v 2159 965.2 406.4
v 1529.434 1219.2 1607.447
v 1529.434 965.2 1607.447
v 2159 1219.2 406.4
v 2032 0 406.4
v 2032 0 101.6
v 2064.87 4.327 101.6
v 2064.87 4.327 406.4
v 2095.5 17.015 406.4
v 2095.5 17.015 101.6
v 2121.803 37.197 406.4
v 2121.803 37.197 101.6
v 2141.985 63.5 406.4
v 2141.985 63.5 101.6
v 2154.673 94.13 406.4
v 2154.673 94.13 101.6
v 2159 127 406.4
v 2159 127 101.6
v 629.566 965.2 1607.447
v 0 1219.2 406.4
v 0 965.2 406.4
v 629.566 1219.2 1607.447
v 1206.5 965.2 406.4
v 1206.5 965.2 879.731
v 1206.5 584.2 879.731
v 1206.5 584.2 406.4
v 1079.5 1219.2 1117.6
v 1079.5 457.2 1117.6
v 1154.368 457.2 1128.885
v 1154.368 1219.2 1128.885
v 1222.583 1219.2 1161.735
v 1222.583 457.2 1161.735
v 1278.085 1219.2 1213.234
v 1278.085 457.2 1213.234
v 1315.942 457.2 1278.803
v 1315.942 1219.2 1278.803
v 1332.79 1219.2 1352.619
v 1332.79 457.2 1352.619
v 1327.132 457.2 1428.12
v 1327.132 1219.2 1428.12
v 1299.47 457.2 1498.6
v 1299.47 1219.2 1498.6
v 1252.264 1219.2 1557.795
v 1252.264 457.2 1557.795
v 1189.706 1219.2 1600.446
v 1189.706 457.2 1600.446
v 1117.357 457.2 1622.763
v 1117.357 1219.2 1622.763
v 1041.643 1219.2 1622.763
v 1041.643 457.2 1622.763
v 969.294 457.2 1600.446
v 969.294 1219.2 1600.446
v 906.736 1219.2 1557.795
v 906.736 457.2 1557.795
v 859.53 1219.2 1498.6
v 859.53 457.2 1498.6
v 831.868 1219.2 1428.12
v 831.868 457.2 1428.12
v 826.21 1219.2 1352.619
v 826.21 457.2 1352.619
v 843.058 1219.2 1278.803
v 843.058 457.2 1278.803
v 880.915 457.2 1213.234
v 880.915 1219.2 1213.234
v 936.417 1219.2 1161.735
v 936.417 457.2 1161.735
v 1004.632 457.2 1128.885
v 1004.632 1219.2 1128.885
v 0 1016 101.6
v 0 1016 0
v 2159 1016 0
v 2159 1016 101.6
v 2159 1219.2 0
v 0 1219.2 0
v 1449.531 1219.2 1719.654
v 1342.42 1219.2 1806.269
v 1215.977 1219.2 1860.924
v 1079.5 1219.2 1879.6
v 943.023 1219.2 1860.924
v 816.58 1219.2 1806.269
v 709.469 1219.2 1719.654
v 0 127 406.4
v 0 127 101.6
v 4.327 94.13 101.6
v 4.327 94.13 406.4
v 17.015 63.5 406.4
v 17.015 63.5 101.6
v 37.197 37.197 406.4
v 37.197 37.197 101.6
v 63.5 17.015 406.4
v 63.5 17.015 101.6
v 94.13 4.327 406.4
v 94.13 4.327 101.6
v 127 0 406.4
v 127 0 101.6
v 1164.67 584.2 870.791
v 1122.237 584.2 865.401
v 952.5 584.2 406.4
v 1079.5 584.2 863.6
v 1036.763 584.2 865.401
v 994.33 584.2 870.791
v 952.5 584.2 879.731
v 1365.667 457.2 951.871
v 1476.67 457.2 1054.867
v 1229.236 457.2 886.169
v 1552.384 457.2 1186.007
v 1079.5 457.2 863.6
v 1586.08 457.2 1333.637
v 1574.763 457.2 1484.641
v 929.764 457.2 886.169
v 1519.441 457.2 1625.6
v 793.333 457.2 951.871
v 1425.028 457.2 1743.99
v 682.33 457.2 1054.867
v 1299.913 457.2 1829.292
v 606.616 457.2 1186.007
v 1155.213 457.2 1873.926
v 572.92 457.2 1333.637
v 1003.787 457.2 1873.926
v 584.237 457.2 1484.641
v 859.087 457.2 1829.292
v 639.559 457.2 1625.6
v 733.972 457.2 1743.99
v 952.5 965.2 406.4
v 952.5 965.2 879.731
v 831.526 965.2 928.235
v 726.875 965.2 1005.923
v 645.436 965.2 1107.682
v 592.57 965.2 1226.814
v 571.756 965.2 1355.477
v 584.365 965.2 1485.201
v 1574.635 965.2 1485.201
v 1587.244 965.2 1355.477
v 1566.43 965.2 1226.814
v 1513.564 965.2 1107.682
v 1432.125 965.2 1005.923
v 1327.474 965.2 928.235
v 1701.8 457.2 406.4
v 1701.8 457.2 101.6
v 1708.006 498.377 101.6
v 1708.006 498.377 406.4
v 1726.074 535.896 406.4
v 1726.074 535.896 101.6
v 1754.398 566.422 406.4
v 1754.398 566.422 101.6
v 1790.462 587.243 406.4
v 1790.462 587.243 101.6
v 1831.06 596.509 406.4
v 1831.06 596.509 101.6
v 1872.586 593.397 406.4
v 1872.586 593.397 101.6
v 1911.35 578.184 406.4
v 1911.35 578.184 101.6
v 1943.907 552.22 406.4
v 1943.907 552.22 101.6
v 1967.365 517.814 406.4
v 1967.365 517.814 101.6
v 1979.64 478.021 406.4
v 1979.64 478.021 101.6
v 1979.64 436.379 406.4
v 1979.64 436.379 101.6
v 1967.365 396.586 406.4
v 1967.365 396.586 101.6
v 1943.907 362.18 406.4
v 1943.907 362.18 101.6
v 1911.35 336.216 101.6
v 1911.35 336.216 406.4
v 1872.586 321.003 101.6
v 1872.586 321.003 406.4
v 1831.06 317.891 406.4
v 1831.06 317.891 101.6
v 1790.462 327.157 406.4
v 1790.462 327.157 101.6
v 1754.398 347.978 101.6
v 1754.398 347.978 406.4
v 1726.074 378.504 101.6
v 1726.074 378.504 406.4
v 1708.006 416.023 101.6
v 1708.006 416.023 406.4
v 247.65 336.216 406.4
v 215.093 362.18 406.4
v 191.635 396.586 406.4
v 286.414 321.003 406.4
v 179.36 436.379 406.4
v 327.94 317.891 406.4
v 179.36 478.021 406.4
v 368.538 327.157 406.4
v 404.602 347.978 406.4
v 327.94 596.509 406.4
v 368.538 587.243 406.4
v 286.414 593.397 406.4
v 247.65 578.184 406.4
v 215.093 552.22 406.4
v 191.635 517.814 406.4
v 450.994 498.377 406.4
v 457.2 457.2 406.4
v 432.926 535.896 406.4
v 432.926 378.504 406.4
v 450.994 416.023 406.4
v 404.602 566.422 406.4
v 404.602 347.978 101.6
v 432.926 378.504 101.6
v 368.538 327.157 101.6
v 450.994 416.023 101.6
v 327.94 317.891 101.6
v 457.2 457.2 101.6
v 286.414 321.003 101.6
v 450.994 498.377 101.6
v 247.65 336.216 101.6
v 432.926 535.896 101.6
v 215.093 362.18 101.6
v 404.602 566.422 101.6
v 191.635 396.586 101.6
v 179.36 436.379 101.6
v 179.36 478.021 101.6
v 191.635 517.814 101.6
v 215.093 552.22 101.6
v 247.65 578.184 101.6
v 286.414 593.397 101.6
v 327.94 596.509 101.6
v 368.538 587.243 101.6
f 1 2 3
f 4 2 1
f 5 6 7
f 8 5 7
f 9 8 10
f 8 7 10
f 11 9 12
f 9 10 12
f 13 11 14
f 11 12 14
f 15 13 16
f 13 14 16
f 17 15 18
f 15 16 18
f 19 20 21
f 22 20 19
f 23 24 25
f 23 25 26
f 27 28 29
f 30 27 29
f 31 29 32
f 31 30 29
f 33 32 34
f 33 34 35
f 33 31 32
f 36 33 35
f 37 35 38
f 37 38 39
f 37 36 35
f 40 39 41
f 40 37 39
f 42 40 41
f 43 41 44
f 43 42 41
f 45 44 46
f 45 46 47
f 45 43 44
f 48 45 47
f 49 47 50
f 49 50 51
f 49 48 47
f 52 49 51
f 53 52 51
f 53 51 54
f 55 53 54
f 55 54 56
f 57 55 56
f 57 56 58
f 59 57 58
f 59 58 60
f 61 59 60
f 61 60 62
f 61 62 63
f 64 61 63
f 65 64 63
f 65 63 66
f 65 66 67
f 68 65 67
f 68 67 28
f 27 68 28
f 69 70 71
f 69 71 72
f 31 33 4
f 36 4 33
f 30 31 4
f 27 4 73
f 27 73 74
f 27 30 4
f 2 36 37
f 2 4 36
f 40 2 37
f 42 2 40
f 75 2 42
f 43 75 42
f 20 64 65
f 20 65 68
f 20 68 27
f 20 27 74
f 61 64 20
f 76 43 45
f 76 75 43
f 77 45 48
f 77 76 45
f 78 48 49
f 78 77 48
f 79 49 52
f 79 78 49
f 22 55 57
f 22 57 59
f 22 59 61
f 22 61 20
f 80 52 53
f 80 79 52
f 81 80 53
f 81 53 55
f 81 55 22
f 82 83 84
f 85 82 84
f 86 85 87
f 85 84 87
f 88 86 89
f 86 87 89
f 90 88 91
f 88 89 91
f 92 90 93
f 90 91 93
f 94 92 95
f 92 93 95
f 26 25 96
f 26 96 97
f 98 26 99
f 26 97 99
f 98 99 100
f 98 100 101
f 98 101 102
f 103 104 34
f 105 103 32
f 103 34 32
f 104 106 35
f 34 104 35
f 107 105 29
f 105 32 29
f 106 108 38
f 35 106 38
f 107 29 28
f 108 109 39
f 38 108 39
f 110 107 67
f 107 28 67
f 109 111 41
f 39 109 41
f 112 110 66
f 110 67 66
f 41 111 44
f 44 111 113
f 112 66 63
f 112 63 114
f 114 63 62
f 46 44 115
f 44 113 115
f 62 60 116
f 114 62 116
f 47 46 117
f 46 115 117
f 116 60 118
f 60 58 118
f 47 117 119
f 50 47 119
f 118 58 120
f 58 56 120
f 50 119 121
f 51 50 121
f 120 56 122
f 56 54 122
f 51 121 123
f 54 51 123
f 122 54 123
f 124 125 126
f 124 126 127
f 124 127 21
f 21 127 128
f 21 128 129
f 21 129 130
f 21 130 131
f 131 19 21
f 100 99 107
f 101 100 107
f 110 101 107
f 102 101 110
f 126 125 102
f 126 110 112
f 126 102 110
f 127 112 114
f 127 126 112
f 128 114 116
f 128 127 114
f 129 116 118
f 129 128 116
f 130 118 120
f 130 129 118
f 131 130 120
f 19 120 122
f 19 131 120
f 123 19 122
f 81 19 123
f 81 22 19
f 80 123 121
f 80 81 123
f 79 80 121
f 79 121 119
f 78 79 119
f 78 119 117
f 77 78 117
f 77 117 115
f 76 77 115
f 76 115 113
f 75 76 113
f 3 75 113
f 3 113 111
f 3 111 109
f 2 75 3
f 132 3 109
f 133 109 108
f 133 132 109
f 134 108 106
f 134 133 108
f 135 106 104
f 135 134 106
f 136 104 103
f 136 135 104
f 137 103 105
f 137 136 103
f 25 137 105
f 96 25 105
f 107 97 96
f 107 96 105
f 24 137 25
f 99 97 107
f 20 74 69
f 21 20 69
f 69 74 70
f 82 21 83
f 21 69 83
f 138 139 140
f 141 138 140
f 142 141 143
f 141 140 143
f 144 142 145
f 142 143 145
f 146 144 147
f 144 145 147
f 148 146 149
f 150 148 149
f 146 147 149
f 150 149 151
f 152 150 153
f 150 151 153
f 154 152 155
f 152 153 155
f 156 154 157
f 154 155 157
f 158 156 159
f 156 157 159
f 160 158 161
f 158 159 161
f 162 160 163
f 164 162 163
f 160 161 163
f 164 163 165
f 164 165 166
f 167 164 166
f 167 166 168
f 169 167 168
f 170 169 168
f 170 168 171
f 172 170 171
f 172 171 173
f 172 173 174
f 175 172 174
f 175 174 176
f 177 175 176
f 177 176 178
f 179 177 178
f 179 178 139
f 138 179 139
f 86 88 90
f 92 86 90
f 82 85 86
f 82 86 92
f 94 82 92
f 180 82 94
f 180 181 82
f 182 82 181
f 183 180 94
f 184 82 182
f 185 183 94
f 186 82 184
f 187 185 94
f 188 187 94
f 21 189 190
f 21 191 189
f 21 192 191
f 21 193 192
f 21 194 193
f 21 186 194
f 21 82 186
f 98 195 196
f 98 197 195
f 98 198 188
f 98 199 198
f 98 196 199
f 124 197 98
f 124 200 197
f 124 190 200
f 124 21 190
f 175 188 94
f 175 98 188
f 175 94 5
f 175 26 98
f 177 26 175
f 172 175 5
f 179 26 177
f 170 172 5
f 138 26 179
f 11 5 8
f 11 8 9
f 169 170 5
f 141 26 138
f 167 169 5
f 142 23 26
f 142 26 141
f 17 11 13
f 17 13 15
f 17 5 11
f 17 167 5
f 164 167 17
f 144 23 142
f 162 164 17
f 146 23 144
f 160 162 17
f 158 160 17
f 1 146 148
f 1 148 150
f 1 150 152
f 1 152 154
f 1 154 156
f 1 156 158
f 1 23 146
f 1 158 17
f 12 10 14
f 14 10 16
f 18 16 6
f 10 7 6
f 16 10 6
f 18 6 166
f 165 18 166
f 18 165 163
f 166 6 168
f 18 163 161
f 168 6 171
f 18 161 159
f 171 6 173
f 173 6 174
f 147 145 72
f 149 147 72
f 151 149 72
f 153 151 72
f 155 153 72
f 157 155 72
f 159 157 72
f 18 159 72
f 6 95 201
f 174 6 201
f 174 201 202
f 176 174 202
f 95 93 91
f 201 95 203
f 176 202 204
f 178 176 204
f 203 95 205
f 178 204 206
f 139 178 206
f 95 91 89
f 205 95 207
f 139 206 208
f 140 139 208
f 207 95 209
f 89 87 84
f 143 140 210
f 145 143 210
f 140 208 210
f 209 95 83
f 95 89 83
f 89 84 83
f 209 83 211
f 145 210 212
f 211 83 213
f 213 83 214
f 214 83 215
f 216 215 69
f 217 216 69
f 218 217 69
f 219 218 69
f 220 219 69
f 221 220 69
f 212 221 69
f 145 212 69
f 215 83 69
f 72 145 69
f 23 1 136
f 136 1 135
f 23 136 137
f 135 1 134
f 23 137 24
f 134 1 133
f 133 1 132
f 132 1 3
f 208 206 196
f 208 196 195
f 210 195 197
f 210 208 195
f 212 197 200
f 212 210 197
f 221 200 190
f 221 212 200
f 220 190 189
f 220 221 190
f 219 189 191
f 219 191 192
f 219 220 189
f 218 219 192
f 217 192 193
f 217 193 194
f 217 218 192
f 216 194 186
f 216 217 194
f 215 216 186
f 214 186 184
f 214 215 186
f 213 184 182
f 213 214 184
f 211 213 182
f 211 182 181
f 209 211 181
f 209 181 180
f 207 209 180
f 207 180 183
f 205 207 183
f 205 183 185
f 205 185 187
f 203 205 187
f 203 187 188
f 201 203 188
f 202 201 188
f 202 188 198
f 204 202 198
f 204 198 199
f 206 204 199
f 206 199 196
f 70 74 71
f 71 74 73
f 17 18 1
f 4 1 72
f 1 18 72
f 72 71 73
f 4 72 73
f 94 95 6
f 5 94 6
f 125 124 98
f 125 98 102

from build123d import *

# Parameters (mm, degrees)
F0_R     = 139.7
F1_DEPTH = 406.4
F2_W     = 889
F2_H     = 101.6
F2_W_2   = 127
F3_DEPTH = 2159.001
F5_DEPTH = 254
F6_DEPTH = 635
F7_DEPTH = 762


with BuildPart() as f1:
    # F0 (on Top) → F1 (new body)
    with BuildSketch(Plane.XY):
        with BuildLine():
            ThreePointArc((0, 127), (37.1974387893, 37.1974387893), (127, 0))
            Line((127, 0), (1079.5, 0))
            Line((1079.5, 0), (2032, 0))
            ThreePointArc((2032, 0), (2121.8025612107, 37.1974387893), (2159, 127))
            Line((2159, 127), (2159, 1219.2))
            Line((2159, 1219.2), (0, 1219.2))
            Line((0, 1219.2), (0, 127))
        make_face()
        with Locations((317.5, 457.2)):
            Circle(F0_R, mode=Mode.SUBTRACT)
        with BuildLine():
            ThreePointArc((1981.2, 457.2), (1841.5, 317.5), (1701.8, 457.2))
            ThreePointArc((1701.8, 457.2), (1841.5, 596.9), (1981.2, 457.2))
        make_face(mode=Mode.SUBTRACT)
    extrude(amount=F1_DEPTH)

    # F2 (on face) → F3 (cut, through all)
    with BuildSketch(Plane(origin=(0, 0, 0), x_dir=(0, -1, 0), z_dir=(-1, 0, 0))):
        with Locations((-571.5, 50.8)):
            Rectangle(F2_W, F2_H)
        with Locations((-63.5, 50.8)):
            Rectangle(F2_W_2, F2_H)
    extrude(amount=-F3_DEPTH, mode=Mode.SUBTRACT)

    # F4 (on face) → F5 (join)
    with BuildSketch(Plane(origin=(0, 1219.2, 0), x_dir=(-1, 0, 0), z_dir=(0, 1, 0))):
        with BuildLine():
            Line((-952.5, 879.7311150317), (-952.5, 406.4))
            Line((-952.5, 406.4), (0, 406.4))
            Line((0, 406.4), (-629.566366733, 1607.4468266802))
            ThreePointArc((-629.566366733, 1607.4468266802), (-586.2301520974, 1493.0448728855), (-571.5, 1371.6))
            ThreePointArc((-571.5, 1371.6), (-677.8907371586, 1060.5148026665), (-952.5, 879.7311150317))
        make_face()
        with BuildLine():
            Line((-2159, 406.4), (-1206.5, 406.4))
            Line((-1206.5, 406.4), (-1206.5, 879.7311150317))
            ThreePointArc((-1206.5, 879.7311150317), (-1543.8335477259, 1165.5457439016), (-1529.433633267, 1607.4468266802))
            Line((-1529.433633267, 1607.4468266802), (-2159, 406.4))
        make_face()
        with BuildLine():
            Line((-1206.5, 965.2), (-1079.5, 965.2))
            Line((-1079.5, 965.2), (-952.5, 965.2))
            Line((-952.5, 965.2), (-952.5, 879.7311150317))
            ThreePointArc((-952.5, 879.7311150317), (-677.8907371586, 1060.5148026665), (-571.5, 1371.6))
            ThreePointArc((-571.5, 1371.6), (-586.2301520974, 1493.0448728855), (-629.566366733, 1607.4468266802))
            ThreePointArc((-629.566366733, 1607.4468266802), (-1079.5, 1879.6), (-1529.433633267, 1607.4468266802))
            ThreePointArc((-1529.433633267, 1607.4468266802), (-1543.8335477259, 1165.5457439016), (-1206.5, 879.7311150317))
            Line((-1206.5, 879.7311150317), (-1206.5, 965.2))
        make_face()
        with BuildLine():
            ThreePointArc((-825.5, 1371.6), (-899.8948775786, 1191.9948775786), (-1079.5, 1117.6))
            ThreePointArc((-1079.5, 1117.6), (-1259.1051224214, 1551.2051224214), (-825.5, 1371.6))
        make_face(mode=Mode.SUBTRACT)
        with BuildLine():
            Line((-1079.5, 863.6), (-1079.5, 406.4))
            Line((-1079.5, 406.4), (-952.5, 406.4))
            Line((-952.5, 406.4), (-952.5, 879.7311150317))
            ThreePointArc((-952.5, 879.7311150317), (-1015.4898194188, 867.6489142963), (-1079.5, 863.6))
        make_face()
        with BuildLine():
            Line((-1079.5, 965.2), (-1079.5, 863.6))
            ThreePointArc((-1079.5, 863.6), (-1015.4898194188, 867.6489142963), (-952.5, 879.7311150317))
            Line((-952.5, 879.7311150317), (-952.5, 965.2))
            Line((-952.5, 965.2), (-1079.5, 965.2))
        make_face()
        with BuildLine():
            ThreePointArc((-1206.5, 879.7311150317), (-1143.5101805812, 867.6489142963), (-1079.5, 863.6))
            Line((-1079.5, 863.6), (-1079.5, 965.2))
            Line((-1079.5, 965.2), (-1206.5, 965.2))
            Line((-1206.5, 965.2), (-1206.5, 879.7311150317))
        make_face()
        with BuildLine():
            Line((-1206.5, 406.4), (-1079.5, 406.4))
            Line((-1079.5, 406.4), (-1079.5, 863.6))
            ThreePointArc((-1079.5, 863.6), (-1143.5101805812, 867.6489142963), (-1206.5, 879.7311150317))
            Line((-1206.5, 879.7311150317), (-1206.5, 406.4))
        make_face()
    extrude(amount=-F5_DEPTH)

    # F4 (on face) → F6 (join)
    with BuildSketch(Plane(origin=(0, 1219.2, 0), x_dir=(-1, 0, 0), z_dir=(0, 1, 0))):
        with BuildLine():
            Line((-1206.5, 406.4), (-1079.5, 406.4))
            Line((-1079.5, 406.4), (-1079.5, 863.6))
            ThreePointArc((-1079.5, 863.6), (-1143.5101805812, 867.6489142963), (-1206.5, 879.7311150317))
            Line((-1206.5, 879.7311150317), (-1206.5, 406.4))
        make_face()
        with BuildLine():
            Line((-1079.5, 863.6), (-1079.5, 406.4))
            Line((-1079.5, 406.4), (-952.5, 406.4))
            Line((-952.5, 406.4), (-952.5, 879.7311150317))
            ThreePointArc((-952.5, 879.7311150317), (-1015.4898194188, 867.6489142963), (-1079.5, 863.6))
        make_face()
    extrude(amount=-F6_DEPTH)

    # F4 (on face) → F7 (join)
    with BuildSketch(Plane(origin=(0, 1219.2, 0), x_dir=(-1, 0, 0), z_dir=(0, 1, 0))):
        with BuildLine():
            ThreePointArc((-1206.5, 879.7311150317), (-1143.5101805812, 867.6489142963), (-1079.5, 863.6))
            Line((-1079.5, 863.6), (-1079.5, 965.2))
            Line((-1079.5, 965.2), (-1206.5, 965.2))
            Line((-1206.5, 965.2), (-1206.5, 879.7311150317))
        make_face()
        with BuildLine():
            Line((-1206.5, 965.2), (-1079.5, 965.2))
            Line((-1079.5, 965.2), (-952.5, 965.2))
            Line((-952.5, 965.2), (-952.5, 879.7311150317))
            ThreePointArc((-952.5, 879.7311150317), (-677.8907371586, 1060.5148026665), (-571.5, 1371.6))
            ThreePointArc((-571.5, 1371.6), (-586.2301520974, 1493.0448728855), (-629.566366733, 1607.4468266802))
            ThreePointArc((-629.566366733, 1607.4468266802), (-1079.5, 1879.6), (-1529.433633267, 1607.4468266802))
            ThreePointArc((-1529.433633267, 1607.4468266802), (-1543.8335477259, 1165.5457439016), (-1206.5, 879.7311150317))
            Line((-1206.5, 879.7311150317), (-1206.5, 965.2))
        make_face()
        with BuildLine():
            ThreePointArc((-825.5, 1371.6), (-899.8948775786, 1191.9948775786), (-1079.5, 1117.6))
            ThreePointArc((-1079.5, 1117.6), (-1259.1051224214, 1551.2051224214), (-825.5, 1371.6))
        make_face(mode=Mode.SUBTRACT)
        with BuildLine():
            Line((-1079.5, 965.2), (-1079.5, 863.6))
            ThreePointArc((-1079.5, 863.6), (-1015.4898194188, 867.6489142963), (-952.5, 879.7311150317))
            Line((-952.5, 879.7311150317), (-952.5, 965.2))
            Line((-952.5, 965.2), (-1079.5, 965.2))
        make_face()
    extrude(amount=-F7_DEPTH)


solid = f1.part
